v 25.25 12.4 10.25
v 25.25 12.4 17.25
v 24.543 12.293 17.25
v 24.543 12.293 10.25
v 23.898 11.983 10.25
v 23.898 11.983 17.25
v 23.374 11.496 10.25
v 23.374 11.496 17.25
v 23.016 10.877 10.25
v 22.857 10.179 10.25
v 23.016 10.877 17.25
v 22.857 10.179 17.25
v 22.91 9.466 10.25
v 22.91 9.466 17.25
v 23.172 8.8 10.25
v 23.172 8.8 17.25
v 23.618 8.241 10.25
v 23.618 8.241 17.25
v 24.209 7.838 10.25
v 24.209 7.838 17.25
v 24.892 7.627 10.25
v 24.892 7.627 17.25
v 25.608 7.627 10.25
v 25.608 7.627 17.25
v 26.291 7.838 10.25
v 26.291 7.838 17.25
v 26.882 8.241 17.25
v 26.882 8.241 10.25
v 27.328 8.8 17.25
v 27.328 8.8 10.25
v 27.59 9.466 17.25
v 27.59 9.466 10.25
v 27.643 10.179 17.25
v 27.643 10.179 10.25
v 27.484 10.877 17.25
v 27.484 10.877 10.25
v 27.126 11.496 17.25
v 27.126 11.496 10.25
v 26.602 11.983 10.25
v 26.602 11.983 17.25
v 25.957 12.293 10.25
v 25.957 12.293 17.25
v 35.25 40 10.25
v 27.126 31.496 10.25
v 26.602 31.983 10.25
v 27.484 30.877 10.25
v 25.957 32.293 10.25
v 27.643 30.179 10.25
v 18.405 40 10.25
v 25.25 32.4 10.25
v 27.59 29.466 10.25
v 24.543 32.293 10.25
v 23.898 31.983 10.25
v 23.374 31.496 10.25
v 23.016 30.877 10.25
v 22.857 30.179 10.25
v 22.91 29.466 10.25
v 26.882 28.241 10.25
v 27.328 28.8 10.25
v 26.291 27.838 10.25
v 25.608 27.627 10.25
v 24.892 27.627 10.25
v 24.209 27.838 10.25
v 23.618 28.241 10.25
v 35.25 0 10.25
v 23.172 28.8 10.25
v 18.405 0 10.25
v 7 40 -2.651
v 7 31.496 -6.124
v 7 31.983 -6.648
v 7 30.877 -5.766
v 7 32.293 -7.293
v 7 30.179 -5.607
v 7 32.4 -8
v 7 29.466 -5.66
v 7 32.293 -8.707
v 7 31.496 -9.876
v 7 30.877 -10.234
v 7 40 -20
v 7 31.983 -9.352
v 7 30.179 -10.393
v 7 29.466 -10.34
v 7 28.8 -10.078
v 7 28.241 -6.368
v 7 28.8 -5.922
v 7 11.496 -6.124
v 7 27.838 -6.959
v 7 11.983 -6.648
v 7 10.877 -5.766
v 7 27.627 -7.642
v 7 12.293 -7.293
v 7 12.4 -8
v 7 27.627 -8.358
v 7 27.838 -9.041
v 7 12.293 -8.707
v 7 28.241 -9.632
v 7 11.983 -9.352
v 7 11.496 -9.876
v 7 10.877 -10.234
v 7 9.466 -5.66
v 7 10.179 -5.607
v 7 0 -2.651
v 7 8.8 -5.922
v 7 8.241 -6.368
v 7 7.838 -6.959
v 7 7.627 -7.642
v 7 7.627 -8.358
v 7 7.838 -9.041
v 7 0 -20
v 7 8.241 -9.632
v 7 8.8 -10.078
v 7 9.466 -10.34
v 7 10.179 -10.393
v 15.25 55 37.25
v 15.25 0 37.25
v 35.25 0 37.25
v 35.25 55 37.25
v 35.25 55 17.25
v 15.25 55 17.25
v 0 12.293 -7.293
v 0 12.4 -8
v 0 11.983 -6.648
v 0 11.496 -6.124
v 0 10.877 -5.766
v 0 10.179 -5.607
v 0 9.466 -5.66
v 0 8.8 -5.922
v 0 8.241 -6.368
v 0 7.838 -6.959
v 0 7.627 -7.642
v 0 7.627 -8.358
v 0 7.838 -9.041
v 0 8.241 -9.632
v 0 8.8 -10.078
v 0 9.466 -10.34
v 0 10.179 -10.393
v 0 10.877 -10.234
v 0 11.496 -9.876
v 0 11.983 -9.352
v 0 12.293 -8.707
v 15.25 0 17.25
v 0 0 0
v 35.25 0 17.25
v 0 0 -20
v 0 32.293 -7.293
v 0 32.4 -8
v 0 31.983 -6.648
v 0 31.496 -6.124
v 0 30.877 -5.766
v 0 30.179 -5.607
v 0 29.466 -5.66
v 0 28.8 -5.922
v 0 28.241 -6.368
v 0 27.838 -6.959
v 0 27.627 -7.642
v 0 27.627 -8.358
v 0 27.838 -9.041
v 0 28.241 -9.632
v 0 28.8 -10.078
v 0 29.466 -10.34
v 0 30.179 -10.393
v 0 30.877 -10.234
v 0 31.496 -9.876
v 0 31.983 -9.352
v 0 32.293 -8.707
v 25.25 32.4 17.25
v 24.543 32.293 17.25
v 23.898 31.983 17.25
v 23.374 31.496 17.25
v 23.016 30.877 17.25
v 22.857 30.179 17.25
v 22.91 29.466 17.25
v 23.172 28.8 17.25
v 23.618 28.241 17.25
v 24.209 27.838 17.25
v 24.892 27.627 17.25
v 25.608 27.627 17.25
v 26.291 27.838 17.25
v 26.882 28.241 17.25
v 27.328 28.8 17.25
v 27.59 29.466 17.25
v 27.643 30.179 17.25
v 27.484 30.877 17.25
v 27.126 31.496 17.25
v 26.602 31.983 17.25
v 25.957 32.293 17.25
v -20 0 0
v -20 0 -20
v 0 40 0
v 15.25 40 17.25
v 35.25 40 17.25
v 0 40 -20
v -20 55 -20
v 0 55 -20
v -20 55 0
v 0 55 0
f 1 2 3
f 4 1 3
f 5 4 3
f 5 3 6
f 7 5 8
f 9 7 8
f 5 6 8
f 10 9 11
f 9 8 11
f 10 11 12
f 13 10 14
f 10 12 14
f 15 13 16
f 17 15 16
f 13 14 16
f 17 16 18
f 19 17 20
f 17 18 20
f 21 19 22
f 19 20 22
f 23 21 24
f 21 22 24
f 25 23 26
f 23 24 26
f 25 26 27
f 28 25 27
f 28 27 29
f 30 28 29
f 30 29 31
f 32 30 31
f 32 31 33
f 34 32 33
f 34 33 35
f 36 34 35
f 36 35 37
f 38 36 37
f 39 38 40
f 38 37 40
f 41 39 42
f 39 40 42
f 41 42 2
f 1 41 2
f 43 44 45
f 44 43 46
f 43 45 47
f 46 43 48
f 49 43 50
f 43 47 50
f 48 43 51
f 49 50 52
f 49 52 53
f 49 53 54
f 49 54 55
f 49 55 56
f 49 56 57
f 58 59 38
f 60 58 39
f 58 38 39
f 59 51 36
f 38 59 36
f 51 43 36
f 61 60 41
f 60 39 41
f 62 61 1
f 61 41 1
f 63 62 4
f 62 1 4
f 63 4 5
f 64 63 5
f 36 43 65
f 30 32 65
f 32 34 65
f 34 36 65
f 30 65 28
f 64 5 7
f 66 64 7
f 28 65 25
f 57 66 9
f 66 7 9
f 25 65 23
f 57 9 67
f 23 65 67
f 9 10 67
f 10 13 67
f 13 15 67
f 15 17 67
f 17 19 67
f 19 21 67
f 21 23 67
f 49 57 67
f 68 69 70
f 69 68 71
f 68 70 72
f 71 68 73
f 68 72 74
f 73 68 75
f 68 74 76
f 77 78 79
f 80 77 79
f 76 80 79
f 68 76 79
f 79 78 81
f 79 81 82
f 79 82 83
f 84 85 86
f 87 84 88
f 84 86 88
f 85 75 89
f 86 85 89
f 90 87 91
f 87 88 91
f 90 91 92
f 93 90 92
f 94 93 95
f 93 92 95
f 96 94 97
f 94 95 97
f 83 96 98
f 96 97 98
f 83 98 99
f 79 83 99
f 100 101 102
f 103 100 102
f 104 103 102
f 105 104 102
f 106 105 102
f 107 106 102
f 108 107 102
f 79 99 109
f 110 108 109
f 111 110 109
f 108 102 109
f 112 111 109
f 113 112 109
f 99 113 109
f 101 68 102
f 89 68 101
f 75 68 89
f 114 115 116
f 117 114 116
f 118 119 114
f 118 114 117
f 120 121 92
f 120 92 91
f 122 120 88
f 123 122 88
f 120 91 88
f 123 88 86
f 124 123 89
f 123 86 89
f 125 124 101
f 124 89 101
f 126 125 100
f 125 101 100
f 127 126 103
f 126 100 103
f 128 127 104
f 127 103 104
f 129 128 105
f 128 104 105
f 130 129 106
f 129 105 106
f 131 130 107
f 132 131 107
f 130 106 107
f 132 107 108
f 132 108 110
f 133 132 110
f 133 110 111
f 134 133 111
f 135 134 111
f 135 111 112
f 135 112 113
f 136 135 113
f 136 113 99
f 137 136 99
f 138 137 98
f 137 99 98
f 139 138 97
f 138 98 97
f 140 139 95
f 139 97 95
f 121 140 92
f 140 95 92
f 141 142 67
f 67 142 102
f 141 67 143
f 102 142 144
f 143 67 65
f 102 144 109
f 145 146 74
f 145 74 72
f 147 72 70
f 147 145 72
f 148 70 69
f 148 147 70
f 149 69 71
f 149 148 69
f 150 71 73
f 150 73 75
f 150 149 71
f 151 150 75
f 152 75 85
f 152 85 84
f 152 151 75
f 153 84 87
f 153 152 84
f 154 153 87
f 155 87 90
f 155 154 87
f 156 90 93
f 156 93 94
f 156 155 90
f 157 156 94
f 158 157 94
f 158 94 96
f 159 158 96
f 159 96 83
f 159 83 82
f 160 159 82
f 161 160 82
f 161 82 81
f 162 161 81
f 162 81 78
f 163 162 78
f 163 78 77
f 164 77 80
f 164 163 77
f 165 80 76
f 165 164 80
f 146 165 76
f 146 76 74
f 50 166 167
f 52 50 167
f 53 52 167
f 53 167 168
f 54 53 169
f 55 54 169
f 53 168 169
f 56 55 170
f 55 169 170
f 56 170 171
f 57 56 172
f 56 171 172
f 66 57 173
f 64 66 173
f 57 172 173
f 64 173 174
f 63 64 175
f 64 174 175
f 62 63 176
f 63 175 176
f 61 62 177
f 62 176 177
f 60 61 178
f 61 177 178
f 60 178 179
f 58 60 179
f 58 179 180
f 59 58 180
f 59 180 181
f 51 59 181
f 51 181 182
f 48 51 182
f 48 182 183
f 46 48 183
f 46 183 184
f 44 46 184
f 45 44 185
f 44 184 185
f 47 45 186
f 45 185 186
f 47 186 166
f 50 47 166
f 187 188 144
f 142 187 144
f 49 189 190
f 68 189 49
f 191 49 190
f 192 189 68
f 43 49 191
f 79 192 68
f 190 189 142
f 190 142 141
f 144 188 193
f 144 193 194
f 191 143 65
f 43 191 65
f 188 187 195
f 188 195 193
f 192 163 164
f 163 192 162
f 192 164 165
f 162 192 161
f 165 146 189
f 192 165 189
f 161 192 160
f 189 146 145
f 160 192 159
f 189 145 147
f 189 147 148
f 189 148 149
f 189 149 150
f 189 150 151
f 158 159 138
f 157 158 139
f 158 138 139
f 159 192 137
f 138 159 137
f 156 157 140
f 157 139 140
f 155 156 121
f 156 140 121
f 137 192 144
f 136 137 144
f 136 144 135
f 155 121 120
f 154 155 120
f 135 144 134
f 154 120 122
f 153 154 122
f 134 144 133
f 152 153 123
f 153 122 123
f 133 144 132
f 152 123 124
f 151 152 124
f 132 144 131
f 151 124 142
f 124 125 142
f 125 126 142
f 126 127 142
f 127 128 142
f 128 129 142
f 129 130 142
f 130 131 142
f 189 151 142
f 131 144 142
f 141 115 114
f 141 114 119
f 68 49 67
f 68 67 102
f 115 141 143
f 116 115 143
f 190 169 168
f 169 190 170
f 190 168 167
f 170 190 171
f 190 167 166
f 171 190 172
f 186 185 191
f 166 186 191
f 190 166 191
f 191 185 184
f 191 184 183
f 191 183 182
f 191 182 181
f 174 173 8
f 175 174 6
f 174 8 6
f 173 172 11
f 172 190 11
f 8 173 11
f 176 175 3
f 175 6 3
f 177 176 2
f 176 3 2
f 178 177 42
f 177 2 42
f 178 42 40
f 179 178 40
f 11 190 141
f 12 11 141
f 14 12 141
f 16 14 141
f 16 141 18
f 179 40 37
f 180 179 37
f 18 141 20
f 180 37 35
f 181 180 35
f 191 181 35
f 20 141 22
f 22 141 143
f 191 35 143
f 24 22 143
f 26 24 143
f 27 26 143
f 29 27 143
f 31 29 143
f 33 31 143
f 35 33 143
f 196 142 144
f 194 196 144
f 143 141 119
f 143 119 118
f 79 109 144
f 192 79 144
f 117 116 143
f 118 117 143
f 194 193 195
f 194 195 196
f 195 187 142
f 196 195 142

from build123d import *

# Parameters (mm, degrees)
SKETCH1_W                     = 20
SKETCH1_H                     = 20
BOSS_EXTRUDE1_DEPTH           = 55
BOSS_EXTRUDE1_2_DEPTH         = 55
EXTRUDE_THIN1_DEPTH           = 40
SKETCH4_W                     = 2.4
SKETCH4_H                     = 27
M4_CLEARANCE_HOLE1_AT_2_COUNT = 2
M4_CLEARANCE_HOLE1_AT_2_PITCH = 20
MIRROR1_COPY_1_SKETCH_W       = 2.4
MIRROR1_COPY_1_SKETCH_H       = 27


with BuildPart() as part:
    # Sketch1 → Boss-Extrude1 (new body)
    with BuildSketch(Plane(origin=(0, 0, 0), x_dir=(1, 0, 0), z_dir=(0, 1, 0))):
        with Locations((-10, 10)):
            Rectangle(SKETCH1_W, SKETCH1_H)
    extrude(amount=BOSS_EXTRUDE1_DEPTH)


with BuildPart() as body_2:
    # Sketch1 → Boss-Extrude1 2 (new body)
    with BuildSketch(Plane(origin=(0, 0, 0), x_dir=(1, 0, 0), z_dir=(0, 1, 0))):
        with Locations((25.25, -27.25)):
            Rectangle(SKETCH1_W, SKETCH1_H)
    extrude(amount=BOSS_EXTRUDE1_2_DEPTH)


with BuildPart() as body_3:
    # Sketch2 → Extrude-Thin1 (new body)
    with BuildSketch(Plane(origin=(0, 0, 0), x_dir=(1, 0, 0), z_dir=(0, 1, 0))):
        Polygon((0, 20), (0, 0), (15.25, -17.25), (35.25, -17.25), (35.25, -10.25), (18.404846651, -10.25), (7, 2.650564245), (7, 20), align=None)
    extrude(amount=EXTRUDE_THIN1_DEPTH)

    # Sketch4 → M4 Clearance Hole1 (revolve, cut)
    with BuildSketch(Plane(origin=(25.25, 30, 10.25), x_dir=(0, 1, 0), z_dir=(1, 0, 0))):
        with Locations((1.2, 13.5)):
            Rectangle(SKETCH4_W, SKETCH4_H)
    m4_clearance_hole1 = revolve(axis=Axis((25.25, 30, 3.9), (0, 0, 1)), mode=Mode.SUBTRACT)

    # M4 Clearance Hole1 at 2: M4 Clearance Hole1 ×2
    with Locations(*[(0, -i * M4_CLEARANCE_HOLE1_AT_2_PITCH, 0) for i in range(1, M4_CLEARANCE_HOLE1_AT_2_COUNT)]):
        add(m4_clearance_hole1, mode=Mode.SUBTRACT)

    # Mirror1: M4 Clearance Hole1 across plane
    add(m4_clearance_hole1.mirror(Plane(origin=(8.625, 0, 8.625), x_dir=(-0.707106781, 0, 0.707106781), z_dir=(-0.707106781, 0, -0.707106781))), mode=Mode.SUBTRACT)

    # Mirror1 copy 1 sketch → Mirror1 copy 1 (revolve, cut)
    with BuildSketch(Plane(origin=(7, 10, -8), x_dir=(0, 1, 0), z_dir=(0, 0, -1))):
        with Locations((1.2, -13.5)):
            Rectangle(MIRROR1_COPY_1_SKETCH_W, MIRROR1_COPY_1_SKETCH_H)
    revolve(axis=Axis((13.35, 10, -8), (1, 0, 0)), mode=Mode.SUBTRACT)


solid = Compound([part.part, body_2.part, body_3.part])
